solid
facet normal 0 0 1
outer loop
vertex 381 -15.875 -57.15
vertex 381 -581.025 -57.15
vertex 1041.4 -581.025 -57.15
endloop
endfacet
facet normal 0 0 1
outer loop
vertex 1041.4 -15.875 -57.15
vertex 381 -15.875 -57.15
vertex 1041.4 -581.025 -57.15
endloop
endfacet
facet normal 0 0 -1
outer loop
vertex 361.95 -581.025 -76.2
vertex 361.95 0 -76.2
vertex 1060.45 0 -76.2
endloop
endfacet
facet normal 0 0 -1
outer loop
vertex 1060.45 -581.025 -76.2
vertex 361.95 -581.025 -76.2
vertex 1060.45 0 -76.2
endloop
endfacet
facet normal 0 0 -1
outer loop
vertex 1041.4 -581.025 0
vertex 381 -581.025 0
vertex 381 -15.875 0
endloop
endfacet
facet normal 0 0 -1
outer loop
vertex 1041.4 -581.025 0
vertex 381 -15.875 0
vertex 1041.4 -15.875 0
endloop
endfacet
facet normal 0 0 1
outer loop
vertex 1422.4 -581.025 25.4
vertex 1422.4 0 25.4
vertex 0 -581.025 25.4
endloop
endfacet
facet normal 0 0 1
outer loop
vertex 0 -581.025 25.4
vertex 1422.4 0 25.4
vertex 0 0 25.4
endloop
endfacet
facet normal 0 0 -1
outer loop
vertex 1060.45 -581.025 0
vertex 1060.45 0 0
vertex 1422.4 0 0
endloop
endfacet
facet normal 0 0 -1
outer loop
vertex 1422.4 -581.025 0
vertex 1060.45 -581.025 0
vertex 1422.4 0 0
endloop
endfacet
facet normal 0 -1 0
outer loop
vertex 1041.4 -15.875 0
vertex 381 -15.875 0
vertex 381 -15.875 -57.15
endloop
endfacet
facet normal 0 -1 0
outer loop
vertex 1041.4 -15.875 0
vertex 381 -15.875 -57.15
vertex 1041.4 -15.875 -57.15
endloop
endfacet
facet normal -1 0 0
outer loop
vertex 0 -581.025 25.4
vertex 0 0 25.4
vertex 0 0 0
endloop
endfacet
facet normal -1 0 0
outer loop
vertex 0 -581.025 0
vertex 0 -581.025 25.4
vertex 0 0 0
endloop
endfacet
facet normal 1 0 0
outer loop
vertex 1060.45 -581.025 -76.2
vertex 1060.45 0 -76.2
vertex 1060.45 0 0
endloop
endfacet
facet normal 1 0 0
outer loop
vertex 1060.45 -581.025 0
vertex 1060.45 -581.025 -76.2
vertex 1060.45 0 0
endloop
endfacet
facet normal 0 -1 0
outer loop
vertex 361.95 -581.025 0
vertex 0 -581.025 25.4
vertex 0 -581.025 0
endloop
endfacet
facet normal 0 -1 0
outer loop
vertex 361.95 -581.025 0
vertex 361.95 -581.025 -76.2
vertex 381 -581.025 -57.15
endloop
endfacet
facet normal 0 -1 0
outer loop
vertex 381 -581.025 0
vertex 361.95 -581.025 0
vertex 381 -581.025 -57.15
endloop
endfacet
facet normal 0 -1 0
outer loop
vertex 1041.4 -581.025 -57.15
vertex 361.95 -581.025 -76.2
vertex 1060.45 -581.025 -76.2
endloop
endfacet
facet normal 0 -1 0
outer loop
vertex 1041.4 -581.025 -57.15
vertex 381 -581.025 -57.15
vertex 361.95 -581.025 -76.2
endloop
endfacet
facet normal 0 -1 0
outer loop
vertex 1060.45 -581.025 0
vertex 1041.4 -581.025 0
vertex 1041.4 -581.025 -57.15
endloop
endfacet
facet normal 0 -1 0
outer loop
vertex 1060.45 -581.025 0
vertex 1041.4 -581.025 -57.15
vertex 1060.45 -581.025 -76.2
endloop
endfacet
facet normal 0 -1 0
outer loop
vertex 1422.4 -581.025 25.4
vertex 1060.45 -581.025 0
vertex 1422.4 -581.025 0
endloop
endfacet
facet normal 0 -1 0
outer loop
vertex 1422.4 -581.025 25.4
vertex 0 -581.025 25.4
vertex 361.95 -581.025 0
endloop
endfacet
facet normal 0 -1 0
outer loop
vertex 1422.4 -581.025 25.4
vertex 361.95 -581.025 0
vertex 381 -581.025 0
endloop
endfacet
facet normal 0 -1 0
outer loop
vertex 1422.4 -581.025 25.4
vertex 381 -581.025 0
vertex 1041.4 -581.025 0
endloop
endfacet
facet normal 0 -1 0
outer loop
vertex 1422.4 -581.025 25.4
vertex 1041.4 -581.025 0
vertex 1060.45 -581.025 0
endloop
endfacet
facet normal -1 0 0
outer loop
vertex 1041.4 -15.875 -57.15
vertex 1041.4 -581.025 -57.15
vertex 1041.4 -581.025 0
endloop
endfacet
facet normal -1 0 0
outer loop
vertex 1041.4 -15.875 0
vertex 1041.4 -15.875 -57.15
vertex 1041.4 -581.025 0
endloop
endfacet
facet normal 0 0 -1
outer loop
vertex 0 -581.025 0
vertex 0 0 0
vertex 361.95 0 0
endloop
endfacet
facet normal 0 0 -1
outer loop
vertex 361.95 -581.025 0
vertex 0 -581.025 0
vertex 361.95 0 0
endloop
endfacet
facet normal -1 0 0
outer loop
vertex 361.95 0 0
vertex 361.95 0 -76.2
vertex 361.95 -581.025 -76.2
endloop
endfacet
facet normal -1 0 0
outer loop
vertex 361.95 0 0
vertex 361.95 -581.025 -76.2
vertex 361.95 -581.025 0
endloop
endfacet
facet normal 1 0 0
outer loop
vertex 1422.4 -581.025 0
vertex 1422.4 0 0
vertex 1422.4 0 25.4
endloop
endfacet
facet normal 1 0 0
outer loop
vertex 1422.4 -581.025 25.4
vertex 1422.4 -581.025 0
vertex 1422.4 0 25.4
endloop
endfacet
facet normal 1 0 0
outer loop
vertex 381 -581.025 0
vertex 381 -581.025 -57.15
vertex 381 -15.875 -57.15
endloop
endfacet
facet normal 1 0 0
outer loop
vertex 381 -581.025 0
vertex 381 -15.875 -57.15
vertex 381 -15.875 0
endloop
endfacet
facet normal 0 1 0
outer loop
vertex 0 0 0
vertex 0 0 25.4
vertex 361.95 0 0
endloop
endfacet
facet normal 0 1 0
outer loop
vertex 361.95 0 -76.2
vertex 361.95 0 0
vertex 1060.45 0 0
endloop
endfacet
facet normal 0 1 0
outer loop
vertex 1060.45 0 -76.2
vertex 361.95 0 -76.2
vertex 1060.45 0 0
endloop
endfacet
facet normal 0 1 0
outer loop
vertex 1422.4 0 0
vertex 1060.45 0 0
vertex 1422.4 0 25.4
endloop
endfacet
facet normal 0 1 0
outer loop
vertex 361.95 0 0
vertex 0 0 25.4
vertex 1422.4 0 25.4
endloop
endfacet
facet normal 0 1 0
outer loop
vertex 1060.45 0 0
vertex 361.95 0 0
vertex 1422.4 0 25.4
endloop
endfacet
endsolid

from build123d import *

# Parameters (mm, degrees)
F0_W     = 698.5
F0_H     = 76.2
F1_DEPTH = 581.025
F2_W     = 660.4
F2_H     = 57.15
F3_DEPTH = 565.15


with BuildPart() as f1:
    # F0 (on Front) → F1 (new body)
    with BuildSketch(Plane.XZ):
        Polygon((0, 25.4), (0, 0), (361.95, 0), (1060.45, 0), (1422.4, 0), (1422.4, 25.4), align=None)
        with Locations((711.2, -38.1)):
            Rectangle(F0_W, F0_H)
    extrude(amount=F1_DEPTH)

    # F2 (on face) → F3 (cut)
    with BuildSketch(Plane.XZ.offset(581.025)):
        with Locations((711.2, -28.575)):
            Rectangle(F2_W, F2_H)
    extrude(amount=-F3_DEPTH, mode=Mode.SUBTRACT)


solid = f1.part
